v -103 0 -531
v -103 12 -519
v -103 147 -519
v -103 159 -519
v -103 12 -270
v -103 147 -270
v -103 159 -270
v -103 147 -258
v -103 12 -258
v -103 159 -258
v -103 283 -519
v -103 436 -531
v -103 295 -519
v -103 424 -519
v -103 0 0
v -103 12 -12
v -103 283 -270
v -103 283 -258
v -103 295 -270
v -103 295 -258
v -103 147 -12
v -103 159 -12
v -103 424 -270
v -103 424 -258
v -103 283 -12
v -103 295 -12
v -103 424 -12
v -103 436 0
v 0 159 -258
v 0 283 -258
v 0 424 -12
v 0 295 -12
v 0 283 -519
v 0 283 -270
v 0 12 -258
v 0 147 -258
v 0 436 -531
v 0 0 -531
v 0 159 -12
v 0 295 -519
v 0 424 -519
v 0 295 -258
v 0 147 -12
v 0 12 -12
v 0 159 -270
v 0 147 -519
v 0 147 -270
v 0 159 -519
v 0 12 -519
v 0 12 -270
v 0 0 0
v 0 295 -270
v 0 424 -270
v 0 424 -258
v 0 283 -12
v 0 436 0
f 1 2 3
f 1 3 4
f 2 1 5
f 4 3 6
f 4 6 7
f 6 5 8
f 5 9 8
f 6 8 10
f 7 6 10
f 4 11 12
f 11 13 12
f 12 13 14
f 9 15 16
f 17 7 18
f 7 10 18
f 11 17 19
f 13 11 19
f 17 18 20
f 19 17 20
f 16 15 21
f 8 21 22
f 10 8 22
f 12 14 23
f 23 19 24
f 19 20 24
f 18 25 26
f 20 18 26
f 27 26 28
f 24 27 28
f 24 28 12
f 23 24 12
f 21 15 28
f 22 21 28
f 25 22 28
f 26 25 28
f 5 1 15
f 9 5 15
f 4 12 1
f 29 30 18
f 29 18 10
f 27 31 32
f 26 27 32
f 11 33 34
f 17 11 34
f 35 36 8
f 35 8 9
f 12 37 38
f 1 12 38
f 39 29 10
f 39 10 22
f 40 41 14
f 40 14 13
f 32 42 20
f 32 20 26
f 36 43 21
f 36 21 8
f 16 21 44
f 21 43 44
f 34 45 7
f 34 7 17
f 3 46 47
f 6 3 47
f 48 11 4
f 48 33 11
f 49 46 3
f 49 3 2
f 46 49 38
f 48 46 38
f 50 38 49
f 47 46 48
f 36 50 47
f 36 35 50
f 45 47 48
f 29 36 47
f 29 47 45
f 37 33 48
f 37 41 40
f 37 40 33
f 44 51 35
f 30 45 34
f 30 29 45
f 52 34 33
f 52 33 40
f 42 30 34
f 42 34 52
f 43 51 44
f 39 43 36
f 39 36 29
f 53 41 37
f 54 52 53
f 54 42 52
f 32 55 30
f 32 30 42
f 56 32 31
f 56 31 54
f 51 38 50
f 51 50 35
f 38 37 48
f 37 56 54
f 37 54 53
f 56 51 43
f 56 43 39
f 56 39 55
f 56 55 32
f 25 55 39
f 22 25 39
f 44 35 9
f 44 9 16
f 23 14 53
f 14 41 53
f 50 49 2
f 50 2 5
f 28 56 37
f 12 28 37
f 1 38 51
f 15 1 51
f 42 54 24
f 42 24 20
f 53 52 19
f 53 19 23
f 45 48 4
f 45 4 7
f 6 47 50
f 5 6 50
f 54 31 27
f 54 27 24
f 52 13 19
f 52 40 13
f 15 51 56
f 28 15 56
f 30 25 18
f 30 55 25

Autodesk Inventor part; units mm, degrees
ref_plane "YZ Plane" through (0, 0, 0) normal (1, 0, 0) x (0, 1, 0)
ref_plane "XZ Plane" through (0, 0, 0) normal (0, 1, 0) x (-1, 0, 0)
ref_plane "XY Plane" through (0, 0, 0) normal (0, 0, 1) x (1, 0, 0)
sketch "Boceto1" plane through (0, 0, 0) normal (1, 0, 0) x (0, 1, 0)
  line L0 (0, 0) -> (436, 0)
  line L1 (436, 0) -> (436, -531)
  line L2 (436, -531) -> (0, -531)
  line L3 (0, -531) -> (0, 0)
  line L4 (0, -531) -> (12, -531)
  line L5 (12, -531) -> (12, 0)
  line L6 (12, 0) -> (0, 0)
  line L7 (0, 0) -> (0, -531)
  line L8 (436, -531) -> (424, -531)
  line L9 (424, -531) -> (424, -513.995)
  line L10 (436, -513.995) -> (436, -531)
  line L11 (436, 0) -> (424, 0)
  line L12 (424, 0) -> (424, -531)
  line L13 (424, -531) -> (436, -531)
  line L14 (436, -531) -> (436, 0)
  line L15 (0, 0) -> (436, 0)
  line L16 (436, 0) -> (436, -12)
  line L17 (436, -12) -> (0, -12)
  line L18 (0, -12) -> (0, 0)
  line L19 (0, -531) -> (436, -531)
  line L20 (436, -531) -> (436, -519)
  line L21 (436, -519) -> (0, -519)
  line L22 (0, -519) -> (0, -531)
  line L23 (12, -519) -> (147, -519)
  line L24 (147, -519) -> (147, -270)
  line L25 (147, -270) -> (12, -270)
  line L26 (12, -270) -> (12, -519)
  line L27 (12, -270) -> (424, -270)
  line L28 (424, -270) -> (424, -258)
  line L29 (424, -258) -> (12, -258)
  line L30 (12, -258) -> (12, -270)
  line L31 (147, -519) -> (159, -519)
  line L32 (159, -519) -> (159, -12)
  line L33 (159, -12) -> (147, -12)
  line L34 (147, -12) -> (147, -519)
  line L35 (159, -519) -> (283, -519)
  line L36 (283, -519) -> (283, -270)
  line L37 (283, -270) -> (159, -270)
  line L38 (159, -270) -> (159, -519)
  line L39 (283, -519) -> (295, -519)
  line L40 (295, -519) -> (295, -270)
  line L41 (295, -270) -> (283, -270)
  line L42 (283, -270) -> (283, -519)
  line L43 (295, -258) -> (295, -12)
  line L44 (283, -12) -> (283, -258)
  point P0 (424, -12)
  point P1 (159, -258)
  point P2 (159, -270)
  point P3 (12, -12)
  point P4 (147, -258)
  point P5 (424, -519)
  point P6 (424, -519)
  dimension "d0" = 436
  dimension "d1" = 531
  dimension "d2" = 12
  dimension "d3" = 12
  dimension "d4" = 12
  dimension "d5" = 12
  dimension "d6" = 12
  dimension "d7" = 135
  dimension "d8" = 249
  dimension "d9" = 12
  dimension "d10" = 12
  dimension "d11" = 124
  dimension "d12" = 12
extrude "Extrusión2" add sketch "Boceto1" against normal blind 103 contours L0 L5 L17 L3 | L0 L12 L17 L5 | L17 L5 L21 L3 | L0 L1 L17 L12 | L21 L5 L2 L3 | L17 L1 L21 L9 L12 | L29 L34 L25 L5 | L17 L32 L29 L34 | L21 L9 L2 L5 | L12 L27 L32 L29 | L43 L29 L44 L17 | L29 L32 L27 L34 | L24 L27 L32 L21 | L9 L21 L1 L2 | L40 L21 L36 L27
properties part number "Estante"
